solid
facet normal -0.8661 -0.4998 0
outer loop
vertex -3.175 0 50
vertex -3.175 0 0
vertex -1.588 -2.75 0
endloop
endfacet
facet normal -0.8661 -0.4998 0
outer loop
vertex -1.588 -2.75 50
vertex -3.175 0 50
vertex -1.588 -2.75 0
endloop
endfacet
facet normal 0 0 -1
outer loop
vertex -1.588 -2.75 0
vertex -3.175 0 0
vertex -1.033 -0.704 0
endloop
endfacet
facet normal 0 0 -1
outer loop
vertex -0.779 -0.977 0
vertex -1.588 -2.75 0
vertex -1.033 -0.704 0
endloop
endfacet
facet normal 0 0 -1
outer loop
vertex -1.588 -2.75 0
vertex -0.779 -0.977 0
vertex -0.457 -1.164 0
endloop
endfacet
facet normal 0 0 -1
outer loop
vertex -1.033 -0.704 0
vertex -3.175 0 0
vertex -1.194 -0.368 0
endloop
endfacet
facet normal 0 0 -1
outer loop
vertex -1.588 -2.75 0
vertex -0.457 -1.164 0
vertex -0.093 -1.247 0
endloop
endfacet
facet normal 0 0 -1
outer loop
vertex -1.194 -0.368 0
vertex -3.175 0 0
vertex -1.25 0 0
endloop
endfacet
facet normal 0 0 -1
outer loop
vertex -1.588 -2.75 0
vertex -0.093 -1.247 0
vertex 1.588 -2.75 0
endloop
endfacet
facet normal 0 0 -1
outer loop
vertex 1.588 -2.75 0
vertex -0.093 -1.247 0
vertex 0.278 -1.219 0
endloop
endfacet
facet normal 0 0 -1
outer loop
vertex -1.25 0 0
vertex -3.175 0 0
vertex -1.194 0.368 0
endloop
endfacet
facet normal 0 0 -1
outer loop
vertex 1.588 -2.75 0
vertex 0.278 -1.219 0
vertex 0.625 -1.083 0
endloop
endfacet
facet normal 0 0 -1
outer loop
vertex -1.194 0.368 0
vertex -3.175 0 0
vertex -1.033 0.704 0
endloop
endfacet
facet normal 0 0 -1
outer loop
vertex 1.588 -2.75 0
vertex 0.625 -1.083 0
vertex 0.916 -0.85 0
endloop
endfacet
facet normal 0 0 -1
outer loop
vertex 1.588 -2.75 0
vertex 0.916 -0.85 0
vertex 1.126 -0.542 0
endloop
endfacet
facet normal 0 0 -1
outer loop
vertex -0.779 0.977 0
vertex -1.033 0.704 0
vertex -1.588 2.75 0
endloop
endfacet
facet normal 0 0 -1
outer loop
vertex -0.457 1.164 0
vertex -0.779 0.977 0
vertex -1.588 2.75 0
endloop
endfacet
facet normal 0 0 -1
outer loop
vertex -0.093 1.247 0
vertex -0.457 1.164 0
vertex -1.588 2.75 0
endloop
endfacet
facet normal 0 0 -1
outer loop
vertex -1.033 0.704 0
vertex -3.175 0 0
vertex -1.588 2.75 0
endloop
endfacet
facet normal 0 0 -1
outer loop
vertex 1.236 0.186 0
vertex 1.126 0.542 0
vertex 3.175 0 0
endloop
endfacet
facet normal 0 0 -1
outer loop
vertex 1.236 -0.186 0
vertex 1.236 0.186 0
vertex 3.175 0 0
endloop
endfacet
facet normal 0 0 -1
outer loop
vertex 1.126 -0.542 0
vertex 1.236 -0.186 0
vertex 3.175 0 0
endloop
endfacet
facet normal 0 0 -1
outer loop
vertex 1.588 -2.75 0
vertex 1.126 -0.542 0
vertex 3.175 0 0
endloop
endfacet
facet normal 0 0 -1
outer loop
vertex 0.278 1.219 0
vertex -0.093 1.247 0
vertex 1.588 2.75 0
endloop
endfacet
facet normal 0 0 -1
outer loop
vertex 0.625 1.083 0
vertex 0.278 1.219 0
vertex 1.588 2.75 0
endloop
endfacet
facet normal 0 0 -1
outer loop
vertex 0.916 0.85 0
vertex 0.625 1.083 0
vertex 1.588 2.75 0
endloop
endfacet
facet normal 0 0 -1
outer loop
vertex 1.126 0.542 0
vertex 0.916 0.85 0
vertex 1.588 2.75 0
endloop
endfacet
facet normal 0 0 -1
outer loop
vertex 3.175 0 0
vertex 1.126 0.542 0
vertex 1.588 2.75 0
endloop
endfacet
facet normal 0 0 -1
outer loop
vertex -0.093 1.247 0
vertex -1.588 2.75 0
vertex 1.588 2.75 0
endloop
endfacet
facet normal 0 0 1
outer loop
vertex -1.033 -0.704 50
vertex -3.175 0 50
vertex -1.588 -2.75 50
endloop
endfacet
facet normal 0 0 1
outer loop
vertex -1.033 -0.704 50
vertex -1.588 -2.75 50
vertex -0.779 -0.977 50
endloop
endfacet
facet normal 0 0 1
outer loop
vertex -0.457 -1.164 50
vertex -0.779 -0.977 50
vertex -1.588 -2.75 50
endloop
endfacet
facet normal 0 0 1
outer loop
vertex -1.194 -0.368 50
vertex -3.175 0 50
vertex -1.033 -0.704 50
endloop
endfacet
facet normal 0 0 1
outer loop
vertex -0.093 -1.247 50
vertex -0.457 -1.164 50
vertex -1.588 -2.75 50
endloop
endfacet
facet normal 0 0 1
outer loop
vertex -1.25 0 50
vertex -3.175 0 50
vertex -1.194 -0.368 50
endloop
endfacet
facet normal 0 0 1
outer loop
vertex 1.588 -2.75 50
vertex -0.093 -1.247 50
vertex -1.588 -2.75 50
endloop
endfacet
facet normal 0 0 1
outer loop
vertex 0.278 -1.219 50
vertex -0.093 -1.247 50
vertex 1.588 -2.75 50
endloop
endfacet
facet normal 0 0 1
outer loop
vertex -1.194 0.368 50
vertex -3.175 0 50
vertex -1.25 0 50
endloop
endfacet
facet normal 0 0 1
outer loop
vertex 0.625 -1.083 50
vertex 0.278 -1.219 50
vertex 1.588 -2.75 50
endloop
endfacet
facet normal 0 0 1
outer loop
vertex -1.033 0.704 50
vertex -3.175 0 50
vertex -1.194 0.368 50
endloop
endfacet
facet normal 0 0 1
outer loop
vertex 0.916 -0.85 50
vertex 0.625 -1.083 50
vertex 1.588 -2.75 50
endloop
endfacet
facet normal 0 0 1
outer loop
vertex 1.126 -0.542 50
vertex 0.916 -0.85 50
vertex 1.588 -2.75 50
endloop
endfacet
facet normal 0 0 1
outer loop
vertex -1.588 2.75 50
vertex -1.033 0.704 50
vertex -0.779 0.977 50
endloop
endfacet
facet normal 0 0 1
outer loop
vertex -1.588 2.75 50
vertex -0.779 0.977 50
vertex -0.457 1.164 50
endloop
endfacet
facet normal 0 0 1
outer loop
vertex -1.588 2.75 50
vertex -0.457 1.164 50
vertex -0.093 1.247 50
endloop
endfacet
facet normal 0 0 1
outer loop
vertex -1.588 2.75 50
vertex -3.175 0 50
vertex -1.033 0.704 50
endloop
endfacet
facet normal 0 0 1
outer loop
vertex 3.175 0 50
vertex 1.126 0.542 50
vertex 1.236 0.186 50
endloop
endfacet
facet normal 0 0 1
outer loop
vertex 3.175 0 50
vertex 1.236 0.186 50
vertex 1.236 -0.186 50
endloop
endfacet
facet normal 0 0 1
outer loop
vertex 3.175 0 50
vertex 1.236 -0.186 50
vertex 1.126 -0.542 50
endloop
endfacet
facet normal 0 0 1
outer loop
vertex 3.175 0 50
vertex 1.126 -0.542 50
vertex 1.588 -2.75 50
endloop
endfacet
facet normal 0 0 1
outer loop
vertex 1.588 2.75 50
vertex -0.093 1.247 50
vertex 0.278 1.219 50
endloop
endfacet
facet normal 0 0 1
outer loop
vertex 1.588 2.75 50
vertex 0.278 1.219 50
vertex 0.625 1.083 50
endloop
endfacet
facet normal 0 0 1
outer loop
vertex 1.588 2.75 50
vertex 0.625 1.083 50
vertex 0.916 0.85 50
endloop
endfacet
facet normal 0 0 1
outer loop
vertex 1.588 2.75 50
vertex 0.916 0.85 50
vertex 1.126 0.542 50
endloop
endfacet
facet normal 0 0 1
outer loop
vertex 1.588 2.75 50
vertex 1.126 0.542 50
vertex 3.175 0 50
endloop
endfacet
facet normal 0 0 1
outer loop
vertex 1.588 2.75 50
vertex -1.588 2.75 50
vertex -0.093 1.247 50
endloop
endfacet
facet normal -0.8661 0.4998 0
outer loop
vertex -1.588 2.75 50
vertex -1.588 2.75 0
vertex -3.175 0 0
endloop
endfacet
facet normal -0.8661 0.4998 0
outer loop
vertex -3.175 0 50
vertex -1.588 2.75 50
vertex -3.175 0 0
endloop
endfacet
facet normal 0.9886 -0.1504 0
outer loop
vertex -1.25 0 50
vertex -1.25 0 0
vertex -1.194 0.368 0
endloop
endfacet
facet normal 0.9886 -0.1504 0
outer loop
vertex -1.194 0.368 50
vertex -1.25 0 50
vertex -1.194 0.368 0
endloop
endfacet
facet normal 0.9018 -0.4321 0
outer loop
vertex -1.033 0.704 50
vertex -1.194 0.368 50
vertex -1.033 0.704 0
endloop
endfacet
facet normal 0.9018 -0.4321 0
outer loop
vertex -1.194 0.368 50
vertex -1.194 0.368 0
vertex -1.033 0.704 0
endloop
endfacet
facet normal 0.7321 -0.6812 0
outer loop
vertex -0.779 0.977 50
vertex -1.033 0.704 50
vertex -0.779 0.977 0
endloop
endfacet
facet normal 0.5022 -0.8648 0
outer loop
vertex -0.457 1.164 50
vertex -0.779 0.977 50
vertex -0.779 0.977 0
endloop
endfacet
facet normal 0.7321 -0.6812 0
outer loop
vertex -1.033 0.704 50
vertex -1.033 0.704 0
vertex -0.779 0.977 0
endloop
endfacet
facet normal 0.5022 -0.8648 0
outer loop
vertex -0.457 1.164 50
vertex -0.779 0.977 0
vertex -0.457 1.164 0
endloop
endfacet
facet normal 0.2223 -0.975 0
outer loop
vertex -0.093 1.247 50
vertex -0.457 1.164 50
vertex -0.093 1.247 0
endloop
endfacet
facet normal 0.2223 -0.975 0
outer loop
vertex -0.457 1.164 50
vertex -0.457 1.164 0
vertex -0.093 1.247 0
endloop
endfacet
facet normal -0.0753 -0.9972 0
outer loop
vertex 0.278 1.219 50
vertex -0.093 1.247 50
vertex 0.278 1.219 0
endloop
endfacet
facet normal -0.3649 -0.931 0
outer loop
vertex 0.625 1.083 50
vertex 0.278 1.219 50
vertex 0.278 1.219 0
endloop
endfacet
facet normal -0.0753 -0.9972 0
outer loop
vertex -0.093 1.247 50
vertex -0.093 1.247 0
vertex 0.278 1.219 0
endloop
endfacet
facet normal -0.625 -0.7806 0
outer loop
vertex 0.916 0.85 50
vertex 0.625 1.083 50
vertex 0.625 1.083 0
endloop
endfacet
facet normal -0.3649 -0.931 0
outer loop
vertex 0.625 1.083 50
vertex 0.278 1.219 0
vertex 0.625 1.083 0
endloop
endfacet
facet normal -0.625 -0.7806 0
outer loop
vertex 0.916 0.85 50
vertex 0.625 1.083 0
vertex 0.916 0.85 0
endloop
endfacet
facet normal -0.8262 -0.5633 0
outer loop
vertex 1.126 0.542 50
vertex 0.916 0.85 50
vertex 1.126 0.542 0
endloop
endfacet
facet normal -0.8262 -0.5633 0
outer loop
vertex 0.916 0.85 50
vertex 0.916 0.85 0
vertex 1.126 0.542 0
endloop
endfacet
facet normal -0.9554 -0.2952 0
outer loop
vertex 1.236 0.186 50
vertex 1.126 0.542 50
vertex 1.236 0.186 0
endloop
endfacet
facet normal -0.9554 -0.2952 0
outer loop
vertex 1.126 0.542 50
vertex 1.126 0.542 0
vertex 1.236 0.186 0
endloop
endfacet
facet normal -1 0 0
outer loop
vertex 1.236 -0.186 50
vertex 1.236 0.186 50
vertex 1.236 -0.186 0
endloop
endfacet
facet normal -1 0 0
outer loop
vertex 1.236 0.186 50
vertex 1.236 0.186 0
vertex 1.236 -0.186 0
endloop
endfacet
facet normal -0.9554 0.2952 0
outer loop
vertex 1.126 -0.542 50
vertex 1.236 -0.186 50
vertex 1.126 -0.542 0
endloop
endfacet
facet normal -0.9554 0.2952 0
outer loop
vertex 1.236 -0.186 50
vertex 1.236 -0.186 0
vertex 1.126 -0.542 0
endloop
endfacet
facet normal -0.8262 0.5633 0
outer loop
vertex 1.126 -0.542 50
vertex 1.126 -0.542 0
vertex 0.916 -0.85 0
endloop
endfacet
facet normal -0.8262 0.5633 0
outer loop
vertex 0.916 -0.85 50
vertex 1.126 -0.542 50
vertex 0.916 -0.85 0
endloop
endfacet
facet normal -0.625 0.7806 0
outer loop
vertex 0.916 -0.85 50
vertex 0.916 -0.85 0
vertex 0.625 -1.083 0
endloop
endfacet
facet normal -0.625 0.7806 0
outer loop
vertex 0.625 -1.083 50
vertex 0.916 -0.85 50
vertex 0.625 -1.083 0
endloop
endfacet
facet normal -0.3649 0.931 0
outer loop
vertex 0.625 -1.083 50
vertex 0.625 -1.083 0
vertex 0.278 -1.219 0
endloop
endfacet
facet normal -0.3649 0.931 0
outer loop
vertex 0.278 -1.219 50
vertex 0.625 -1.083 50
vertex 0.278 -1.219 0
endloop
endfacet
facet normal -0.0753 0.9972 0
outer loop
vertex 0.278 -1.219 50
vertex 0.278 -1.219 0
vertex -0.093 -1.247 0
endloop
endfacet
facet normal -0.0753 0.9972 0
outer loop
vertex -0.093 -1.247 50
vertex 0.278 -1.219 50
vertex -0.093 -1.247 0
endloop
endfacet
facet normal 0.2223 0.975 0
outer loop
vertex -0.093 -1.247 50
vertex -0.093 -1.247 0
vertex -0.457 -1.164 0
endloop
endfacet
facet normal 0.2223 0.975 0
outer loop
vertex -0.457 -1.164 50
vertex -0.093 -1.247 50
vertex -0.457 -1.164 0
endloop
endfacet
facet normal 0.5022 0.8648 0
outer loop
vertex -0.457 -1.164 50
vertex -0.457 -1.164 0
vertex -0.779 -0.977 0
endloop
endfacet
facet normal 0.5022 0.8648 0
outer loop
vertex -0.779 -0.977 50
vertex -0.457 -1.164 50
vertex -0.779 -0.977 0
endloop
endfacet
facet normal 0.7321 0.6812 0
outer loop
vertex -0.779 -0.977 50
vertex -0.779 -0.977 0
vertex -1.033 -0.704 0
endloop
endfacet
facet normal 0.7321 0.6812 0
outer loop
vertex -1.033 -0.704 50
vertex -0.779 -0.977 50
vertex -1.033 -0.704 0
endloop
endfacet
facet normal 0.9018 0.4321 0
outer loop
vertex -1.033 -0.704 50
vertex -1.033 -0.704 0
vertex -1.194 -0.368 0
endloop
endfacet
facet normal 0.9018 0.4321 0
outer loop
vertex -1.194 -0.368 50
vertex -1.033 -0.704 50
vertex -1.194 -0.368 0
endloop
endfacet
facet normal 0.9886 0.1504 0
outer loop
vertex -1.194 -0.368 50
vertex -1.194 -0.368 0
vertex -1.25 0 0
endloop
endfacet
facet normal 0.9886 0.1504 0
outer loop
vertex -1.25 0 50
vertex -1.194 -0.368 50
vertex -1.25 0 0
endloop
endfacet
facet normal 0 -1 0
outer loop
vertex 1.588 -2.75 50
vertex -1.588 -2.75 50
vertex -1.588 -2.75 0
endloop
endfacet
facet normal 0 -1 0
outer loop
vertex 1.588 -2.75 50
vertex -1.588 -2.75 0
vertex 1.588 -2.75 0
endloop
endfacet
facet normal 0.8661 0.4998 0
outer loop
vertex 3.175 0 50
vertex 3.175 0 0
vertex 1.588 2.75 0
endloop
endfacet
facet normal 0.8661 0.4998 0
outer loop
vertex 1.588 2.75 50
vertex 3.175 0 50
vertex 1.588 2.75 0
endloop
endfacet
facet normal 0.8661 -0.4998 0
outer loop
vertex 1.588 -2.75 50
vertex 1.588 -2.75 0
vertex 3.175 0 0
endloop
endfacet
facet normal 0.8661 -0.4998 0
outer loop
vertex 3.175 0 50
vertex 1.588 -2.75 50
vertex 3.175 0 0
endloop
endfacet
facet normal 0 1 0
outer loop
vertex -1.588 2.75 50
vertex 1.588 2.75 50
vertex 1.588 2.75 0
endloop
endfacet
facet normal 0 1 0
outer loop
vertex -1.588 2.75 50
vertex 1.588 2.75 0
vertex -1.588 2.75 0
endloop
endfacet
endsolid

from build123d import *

# Parameters (mm, degrees)
BOSS_EXTRUDE1_DEPTH   = 50
M3X0_5_TAPPED_HOLE1_D = 2.5


with BuildPart() as part:
    # Sketch1 → Boss-Extrude1 (new body)
    with BuildSketch(Plane.XY):
        Polygon((3.175426481, 0), (1.58771324, 2.75), (-1.58771324, 2.75), (-3.175426481, 0), (-1.58771324, -2.75), (1.58771324, -2.75), align=None)
    extrude(amount=BOSS_EXTRUDE1_DEPTH)

    # M3x0.5 Tapped Hole1 (through all)
    with Locations(Plane.XY.offset(50)):
        with Locations((0, 0)):
            Hole(M3X0_5_TAPPED_HOLE1_D / 2)


solid = part.part
